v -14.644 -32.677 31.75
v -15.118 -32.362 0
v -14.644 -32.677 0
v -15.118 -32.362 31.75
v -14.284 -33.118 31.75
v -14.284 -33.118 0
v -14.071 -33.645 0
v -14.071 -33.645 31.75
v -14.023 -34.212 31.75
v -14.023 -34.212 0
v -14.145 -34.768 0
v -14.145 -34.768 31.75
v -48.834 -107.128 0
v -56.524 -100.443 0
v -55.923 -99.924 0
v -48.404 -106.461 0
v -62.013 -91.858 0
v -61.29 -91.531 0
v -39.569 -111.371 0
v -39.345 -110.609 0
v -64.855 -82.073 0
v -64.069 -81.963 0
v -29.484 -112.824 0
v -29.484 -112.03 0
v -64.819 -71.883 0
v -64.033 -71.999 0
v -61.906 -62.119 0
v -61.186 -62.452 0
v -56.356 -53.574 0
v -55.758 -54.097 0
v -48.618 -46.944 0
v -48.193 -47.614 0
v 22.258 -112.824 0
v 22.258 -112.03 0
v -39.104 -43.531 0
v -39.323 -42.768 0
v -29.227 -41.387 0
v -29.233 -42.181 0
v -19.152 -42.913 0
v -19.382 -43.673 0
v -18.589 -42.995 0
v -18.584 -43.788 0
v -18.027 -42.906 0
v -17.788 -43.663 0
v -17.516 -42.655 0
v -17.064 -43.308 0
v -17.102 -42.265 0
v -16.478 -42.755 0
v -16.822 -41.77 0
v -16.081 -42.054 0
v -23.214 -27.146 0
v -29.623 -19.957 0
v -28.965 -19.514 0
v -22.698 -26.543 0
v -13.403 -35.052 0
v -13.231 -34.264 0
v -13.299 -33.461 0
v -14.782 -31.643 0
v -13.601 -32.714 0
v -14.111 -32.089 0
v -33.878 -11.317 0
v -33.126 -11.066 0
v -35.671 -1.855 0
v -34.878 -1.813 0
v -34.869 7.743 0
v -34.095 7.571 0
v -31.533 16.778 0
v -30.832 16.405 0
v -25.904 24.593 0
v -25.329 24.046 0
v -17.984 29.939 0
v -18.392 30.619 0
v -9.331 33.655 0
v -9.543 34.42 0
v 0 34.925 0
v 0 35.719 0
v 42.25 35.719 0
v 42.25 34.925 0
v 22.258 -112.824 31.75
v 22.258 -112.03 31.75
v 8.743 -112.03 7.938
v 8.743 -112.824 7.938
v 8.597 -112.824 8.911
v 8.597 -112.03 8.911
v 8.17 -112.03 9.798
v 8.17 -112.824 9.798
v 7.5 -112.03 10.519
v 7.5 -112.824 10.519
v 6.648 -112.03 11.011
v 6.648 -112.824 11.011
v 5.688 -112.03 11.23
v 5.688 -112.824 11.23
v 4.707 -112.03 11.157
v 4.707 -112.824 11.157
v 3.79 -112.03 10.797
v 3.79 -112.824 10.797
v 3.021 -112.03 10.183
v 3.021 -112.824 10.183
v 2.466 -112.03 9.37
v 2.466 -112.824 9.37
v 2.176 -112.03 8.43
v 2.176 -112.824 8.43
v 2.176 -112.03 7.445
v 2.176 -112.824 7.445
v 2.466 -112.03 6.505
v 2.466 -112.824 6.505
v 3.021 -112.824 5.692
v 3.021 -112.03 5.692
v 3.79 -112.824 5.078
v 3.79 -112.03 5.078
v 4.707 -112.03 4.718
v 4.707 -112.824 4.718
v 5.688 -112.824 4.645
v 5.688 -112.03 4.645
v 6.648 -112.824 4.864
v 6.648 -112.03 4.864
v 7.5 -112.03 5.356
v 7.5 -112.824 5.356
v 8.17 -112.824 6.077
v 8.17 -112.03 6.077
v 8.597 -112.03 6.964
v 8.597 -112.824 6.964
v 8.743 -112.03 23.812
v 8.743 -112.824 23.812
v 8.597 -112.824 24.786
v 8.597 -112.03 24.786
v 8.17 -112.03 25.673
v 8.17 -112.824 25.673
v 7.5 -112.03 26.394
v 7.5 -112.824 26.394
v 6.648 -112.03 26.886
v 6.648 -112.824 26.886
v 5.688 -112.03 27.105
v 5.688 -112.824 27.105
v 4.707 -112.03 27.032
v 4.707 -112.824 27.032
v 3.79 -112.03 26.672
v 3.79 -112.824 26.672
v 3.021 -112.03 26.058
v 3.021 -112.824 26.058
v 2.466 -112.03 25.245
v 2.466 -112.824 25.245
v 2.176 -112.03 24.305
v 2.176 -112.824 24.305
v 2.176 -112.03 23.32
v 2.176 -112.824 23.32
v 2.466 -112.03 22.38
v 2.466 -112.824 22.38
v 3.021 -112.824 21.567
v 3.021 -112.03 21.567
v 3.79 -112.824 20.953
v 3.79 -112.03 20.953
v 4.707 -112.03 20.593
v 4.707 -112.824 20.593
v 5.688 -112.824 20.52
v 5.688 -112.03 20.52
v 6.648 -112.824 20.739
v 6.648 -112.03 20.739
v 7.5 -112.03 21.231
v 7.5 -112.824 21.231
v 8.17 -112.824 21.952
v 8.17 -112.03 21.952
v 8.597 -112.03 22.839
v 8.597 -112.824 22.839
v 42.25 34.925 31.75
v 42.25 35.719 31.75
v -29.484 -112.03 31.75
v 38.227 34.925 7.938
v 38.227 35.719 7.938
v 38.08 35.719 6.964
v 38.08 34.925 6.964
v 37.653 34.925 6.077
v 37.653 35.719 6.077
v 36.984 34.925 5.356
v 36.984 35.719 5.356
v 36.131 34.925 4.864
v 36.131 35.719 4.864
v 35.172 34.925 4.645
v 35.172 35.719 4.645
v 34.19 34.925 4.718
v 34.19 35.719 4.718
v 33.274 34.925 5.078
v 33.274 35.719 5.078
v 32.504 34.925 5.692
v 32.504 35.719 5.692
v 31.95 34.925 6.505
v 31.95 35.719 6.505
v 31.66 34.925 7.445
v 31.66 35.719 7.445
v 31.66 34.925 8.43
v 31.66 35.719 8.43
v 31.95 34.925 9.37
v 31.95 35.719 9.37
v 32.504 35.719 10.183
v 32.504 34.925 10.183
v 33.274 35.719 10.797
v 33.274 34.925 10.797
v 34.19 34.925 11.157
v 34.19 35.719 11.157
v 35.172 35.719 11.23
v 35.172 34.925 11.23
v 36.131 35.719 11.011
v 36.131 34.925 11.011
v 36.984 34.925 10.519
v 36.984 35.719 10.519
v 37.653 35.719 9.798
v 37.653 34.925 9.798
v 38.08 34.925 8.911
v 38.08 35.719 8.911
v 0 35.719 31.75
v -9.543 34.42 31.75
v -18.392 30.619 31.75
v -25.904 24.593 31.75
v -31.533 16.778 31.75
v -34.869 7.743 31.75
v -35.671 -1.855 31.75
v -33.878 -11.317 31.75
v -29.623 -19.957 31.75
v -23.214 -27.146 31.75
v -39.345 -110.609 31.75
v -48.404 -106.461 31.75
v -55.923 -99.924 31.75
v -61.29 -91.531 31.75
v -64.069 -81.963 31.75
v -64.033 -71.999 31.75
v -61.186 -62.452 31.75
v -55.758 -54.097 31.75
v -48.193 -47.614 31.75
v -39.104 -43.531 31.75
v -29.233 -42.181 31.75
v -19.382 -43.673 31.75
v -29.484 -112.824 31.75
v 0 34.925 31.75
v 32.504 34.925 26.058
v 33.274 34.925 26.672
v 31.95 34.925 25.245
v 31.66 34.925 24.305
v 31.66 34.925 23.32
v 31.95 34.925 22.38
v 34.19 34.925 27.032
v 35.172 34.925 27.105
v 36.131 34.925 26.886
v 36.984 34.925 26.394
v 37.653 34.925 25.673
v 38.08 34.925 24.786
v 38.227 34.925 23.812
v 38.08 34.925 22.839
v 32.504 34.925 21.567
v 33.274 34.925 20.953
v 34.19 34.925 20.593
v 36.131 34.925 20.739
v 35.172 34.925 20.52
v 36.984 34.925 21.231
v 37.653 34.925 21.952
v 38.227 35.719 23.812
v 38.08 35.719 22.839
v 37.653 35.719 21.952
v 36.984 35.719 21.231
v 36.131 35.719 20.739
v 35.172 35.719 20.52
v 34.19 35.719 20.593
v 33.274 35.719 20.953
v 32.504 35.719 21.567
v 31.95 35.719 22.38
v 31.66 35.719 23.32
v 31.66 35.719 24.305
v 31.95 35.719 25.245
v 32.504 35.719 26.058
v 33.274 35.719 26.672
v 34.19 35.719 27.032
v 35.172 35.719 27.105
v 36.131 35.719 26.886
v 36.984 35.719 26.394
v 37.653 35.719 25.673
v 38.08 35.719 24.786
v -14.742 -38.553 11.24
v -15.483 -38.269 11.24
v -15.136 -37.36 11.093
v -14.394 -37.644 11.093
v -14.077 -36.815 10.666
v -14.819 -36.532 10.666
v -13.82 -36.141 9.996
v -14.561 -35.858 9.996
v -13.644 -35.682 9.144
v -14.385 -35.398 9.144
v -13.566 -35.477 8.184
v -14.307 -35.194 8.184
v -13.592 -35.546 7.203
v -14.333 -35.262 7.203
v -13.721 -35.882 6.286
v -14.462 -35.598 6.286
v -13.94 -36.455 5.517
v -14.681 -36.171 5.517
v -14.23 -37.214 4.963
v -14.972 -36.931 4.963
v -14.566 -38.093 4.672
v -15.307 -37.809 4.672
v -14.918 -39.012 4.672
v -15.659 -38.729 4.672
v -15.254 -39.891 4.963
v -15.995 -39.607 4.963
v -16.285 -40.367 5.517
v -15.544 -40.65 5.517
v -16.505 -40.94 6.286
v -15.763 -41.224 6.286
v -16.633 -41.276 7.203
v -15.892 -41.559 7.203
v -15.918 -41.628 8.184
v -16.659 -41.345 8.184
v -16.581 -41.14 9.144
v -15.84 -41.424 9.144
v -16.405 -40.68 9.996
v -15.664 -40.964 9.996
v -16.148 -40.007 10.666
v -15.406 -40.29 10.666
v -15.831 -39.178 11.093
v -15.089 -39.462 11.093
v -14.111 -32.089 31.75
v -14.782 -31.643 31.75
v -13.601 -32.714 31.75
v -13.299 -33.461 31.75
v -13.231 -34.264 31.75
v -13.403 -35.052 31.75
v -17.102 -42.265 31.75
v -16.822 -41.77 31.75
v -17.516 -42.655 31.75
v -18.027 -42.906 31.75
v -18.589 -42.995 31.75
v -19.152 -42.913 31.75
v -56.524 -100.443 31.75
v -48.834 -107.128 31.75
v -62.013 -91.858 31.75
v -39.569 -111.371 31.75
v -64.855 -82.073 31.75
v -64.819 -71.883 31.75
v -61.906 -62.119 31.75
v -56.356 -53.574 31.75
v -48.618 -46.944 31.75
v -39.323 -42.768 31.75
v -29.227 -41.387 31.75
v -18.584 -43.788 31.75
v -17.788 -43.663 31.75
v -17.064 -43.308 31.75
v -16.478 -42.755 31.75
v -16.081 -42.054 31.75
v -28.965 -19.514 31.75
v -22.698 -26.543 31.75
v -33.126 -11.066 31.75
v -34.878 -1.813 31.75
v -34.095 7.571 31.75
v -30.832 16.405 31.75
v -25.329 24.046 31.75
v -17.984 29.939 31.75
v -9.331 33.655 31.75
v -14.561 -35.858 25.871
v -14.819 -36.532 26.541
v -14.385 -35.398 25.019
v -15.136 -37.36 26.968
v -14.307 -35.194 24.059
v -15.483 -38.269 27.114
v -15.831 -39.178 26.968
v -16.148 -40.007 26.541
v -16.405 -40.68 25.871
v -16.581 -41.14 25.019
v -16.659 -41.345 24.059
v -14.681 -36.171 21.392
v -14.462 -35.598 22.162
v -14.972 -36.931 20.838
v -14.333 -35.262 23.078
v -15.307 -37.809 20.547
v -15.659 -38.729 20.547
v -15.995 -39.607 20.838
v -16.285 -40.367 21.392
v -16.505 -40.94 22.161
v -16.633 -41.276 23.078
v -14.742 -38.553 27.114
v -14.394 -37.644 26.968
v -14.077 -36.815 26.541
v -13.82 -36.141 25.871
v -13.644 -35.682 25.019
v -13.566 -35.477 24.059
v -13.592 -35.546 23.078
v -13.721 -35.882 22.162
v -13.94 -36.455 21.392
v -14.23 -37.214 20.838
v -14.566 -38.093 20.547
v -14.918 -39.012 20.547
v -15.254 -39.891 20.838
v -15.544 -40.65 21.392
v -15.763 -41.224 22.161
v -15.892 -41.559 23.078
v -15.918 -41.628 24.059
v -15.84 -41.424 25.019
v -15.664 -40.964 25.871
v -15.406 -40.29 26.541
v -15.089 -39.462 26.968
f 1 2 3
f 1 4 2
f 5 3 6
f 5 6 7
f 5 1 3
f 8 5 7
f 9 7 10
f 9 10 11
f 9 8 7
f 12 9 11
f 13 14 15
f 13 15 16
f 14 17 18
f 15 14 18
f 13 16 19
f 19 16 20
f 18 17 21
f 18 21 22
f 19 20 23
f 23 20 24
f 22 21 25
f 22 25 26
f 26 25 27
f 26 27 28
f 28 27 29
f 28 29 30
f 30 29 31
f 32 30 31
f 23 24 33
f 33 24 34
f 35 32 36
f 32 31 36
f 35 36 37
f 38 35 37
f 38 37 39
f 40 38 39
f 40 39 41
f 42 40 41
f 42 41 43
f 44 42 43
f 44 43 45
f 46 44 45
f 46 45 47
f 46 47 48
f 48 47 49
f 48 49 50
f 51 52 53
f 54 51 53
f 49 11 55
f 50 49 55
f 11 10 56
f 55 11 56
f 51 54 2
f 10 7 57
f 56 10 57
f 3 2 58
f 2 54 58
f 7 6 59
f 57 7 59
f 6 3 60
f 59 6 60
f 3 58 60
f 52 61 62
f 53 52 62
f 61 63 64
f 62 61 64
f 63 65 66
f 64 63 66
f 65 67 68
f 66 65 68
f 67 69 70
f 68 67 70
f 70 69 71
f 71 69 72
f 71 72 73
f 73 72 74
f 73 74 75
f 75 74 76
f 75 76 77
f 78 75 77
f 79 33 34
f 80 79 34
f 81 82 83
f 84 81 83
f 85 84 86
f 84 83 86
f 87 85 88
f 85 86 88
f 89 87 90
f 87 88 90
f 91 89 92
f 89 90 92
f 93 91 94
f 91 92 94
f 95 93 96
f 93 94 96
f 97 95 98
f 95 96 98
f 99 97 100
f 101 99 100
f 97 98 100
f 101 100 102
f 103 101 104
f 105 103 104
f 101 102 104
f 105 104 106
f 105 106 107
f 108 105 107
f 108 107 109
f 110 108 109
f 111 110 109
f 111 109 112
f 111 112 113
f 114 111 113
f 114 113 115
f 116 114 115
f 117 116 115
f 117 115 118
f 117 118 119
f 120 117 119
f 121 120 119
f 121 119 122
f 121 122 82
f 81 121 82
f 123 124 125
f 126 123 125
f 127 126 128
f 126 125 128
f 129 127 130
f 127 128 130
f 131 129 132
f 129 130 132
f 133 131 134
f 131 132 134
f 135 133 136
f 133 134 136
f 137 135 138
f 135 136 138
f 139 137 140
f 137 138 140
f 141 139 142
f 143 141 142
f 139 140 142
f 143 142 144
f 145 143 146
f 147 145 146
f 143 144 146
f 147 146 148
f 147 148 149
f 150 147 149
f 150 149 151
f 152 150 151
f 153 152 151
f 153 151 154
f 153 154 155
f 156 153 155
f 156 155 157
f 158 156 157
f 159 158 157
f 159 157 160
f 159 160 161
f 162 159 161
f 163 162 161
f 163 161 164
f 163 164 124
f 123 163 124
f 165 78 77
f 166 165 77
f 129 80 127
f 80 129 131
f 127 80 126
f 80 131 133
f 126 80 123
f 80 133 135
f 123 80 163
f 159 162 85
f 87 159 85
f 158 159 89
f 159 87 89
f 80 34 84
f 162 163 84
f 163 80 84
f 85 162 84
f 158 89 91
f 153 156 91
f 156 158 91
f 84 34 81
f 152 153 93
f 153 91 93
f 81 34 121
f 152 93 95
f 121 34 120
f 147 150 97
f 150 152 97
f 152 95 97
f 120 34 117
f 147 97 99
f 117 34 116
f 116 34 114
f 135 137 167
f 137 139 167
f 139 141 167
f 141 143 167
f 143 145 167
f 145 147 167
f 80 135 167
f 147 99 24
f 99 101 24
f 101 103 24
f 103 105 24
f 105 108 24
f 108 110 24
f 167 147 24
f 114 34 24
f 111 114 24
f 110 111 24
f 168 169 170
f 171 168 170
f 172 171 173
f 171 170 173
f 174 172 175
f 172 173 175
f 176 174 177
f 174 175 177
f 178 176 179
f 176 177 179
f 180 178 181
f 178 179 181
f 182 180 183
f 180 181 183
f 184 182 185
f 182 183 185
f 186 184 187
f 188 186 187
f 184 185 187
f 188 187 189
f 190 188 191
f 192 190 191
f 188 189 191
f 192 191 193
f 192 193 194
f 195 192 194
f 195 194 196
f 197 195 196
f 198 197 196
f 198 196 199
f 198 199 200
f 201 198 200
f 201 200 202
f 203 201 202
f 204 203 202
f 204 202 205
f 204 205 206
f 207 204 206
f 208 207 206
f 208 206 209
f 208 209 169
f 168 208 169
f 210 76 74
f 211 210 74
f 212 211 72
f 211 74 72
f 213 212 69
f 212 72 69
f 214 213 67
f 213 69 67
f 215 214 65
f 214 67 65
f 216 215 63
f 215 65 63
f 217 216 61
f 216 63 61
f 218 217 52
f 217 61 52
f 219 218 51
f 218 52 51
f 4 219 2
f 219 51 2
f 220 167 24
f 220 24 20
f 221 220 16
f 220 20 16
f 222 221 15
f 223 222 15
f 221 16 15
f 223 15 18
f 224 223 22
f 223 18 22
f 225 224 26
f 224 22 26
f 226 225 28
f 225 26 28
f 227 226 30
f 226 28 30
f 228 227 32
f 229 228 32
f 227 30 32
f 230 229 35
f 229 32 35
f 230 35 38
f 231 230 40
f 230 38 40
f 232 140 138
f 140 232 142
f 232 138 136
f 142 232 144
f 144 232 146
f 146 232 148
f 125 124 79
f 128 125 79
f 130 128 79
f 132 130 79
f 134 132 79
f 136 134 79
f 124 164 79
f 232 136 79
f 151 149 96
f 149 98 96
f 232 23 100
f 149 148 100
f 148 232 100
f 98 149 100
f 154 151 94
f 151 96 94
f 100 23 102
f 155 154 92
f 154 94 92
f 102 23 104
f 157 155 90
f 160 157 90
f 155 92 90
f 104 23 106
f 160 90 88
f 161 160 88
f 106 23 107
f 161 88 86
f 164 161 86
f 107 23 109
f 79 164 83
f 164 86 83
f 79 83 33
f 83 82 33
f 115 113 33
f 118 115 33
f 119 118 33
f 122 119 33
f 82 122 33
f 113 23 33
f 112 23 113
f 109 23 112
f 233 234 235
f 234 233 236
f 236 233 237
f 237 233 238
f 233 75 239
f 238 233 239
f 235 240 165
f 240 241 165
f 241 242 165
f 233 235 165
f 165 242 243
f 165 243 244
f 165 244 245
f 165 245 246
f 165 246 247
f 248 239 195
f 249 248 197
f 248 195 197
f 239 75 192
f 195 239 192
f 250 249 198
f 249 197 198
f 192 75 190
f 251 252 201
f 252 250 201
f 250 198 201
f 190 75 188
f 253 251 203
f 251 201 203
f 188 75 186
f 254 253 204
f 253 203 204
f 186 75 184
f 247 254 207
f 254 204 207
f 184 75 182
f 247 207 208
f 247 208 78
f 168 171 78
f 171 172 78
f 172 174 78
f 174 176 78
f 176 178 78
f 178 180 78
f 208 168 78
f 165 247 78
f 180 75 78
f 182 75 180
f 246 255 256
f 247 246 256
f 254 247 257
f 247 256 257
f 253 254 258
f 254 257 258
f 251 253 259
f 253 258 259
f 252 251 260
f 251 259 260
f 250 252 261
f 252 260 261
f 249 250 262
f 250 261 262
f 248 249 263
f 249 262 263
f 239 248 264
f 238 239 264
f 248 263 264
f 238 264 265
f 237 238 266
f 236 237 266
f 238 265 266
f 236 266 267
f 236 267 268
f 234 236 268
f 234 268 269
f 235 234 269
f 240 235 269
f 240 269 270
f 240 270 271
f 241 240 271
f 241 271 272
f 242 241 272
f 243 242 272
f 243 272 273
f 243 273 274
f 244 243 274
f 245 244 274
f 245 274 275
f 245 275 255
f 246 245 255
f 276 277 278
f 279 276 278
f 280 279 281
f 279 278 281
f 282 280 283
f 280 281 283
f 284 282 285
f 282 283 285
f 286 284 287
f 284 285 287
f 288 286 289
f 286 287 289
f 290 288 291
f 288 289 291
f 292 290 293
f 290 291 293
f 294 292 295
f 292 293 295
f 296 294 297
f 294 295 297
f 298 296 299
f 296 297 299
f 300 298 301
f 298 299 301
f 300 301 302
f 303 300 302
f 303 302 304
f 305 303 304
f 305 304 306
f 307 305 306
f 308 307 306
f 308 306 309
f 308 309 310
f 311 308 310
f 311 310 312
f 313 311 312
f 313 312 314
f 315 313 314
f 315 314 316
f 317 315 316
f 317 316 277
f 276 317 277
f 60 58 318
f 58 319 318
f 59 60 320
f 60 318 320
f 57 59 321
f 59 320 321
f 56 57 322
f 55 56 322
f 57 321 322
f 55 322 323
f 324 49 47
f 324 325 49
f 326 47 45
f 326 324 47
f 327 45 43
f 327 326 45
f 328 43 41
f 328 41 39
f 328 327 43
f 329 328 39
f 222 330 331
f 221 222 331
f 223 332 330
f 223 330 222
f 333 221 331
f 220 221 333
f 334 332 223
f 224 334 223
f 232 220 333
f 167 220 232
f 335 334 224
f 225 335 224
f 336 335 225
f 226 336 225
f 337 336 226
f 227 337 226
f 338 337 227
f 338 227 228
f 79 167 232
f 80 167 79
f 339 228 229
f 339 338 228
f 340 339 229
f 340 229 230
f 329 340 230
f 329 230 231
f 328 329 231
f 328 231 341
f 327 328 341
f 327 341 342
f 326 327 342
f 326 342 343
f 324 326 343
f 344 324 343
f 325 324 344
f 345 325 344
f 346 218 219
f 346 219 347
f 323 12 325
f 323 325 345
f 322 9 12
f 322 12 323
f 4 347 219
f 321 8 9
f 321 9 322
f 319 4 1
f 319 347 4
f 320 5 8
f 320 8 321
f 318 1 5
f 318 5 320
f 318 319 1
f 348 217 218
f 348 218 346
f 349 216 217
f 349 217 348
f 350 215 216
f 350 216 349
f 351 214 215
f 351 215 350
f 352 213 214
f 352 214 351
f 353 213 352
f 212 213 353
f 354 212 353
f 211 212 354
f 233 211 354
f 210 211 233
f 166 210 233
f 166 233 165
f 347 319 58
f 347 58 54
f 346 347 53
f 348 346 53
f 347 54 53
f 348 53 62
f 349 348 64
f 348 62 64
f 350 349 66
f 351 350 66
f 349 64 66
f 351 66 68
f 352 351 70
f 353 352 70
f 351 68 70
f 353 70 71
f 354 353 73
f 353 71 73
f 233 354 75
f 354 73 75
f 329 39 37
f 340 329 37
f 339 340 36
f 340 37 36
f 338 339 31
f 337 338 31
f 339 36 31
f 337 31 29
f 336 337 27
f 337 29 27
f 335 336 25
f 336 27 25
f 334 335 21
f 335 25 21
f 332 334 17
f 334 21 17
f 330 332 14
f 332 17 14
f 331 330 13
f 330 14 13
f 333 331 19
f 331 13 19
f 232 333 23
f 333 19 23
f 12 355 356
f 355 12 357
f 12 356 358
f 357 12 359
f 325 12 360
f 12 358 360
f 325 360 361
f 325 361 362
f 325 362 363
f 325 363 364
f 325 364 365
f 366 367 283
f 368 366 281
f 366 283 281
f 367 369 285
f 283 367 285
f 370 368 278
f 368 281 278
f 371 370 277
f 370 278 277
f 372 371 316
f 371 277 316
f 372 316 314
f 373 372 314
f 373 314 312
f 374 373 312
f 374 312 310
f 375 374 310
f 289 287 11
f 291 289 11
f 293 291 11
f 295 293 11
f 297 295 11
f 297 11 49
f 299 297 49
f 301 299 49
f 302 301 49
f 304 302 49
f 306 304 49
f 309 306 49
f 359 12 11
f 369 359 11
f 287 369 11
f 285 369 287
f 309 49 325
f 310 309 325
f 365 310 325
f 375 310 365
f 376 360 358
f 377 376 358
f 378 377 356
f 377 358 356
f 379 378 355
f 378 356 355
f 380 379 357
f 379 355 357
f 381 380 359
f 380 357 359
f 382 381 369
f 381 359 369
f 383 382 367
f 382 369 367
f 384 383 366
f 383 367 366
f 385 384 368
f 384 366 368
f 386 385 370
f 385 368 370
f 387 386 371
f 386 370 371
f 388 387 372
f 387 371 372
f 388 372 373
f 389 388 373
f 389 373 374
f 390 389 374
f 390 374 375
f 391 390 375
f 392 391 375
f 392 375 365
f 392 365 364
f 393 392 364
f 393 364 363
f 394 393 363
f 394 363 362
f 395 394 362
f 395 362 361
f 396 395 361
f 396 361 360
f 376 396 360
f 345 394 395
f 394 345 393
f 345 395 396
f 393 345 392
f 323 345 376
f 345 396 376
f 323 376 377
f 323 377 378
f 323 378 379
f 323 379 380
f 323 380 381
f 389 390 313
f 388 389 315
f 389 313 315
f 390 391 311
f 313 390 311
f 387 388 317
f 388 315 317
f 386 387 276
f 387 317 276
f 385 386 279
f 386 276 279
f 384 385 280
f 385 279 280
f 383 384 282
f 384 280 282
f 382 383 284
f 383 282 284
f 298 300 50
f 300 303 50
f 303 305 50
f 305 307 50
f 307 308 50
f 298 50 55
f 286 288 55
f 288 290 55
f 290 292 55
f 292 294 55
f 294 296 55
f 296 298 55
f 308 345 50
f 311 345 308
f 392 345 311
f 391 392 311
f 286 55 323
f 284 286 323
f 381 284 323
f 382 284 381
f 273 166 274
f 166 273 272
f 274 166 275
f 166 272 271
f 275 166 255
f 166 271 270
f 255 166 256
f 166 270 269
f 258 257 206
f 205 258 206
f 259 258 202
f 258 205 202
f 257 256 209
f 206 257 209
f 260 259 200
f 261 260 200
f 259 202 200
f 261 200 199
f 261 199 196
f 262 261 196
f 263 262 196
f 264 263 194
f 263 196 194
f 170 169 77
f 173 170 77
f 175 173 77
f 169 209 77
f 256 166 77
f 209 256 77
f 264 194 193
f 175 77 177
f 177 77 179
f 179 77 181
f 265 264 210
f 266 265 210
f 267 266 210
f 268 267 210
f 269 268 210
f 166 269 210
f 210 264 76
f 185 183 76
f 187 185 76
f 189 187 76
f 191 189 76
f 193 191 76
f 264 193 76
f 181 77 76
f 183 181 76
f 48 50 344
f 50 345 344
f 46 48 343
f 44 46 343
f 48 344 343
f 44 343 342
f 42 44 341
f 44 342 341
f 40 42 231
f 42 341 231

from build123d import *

# Parameters (mm, degrees)
BOSS_EXTRUDE1_DEPTH = 31.75
SKETCH2_R           = 3.302
CUT_EXTRUDE1_DEPTH  = 81.553334057
SKETCH3_R           = 3.302
CUT_EXTRUDE2_DEPTH  = 31.75
SKETCH4_R           = 3.302
CUT_EXTRUDE3_DEPTH  = 31.75
FILLET1_R           = 1.905
FILLET2_R           = 2.69875


with BuildPart() as part:
    # Sketch1 → Boss-Extrude1 (new body)
    with BuildSketch(Plane.XY):
        with BuildLine():
            Line((-17.009825212, -44.483777619), (-12.473871822, -32.621436921))
            ThreePointArc((-12.473871822, -32.621436921), (-34.344281252, 6.34239468), (0, 34.925))
            Line((0, 34.925), (42.249880176, 34.925))
            Line((42.249880176, 34.925), (42.249880176, 35.71875))
            Line((42.249880176, 35.71875), (0, 35.71875))
            ThreePointArc((0, 35.71875), (-35.050587448, 6.876439568), (-13.495614846, -33.071097373))
            Line((-13.495614846, -33.071097373), (-17.470874776, -43.467122992))
            ThreePointArc((-17.470874776, -43.467122992), (-64.678438716, -71.009375011), (-29.483697034, -112.82396454))
            Line((-29.483697034, -112.82396454), (22.258027731, -112.82396454))
            Line((22.258027731, -112.82396454), (22.258027731, -112.03021454))
            Line((22.258027731, -112.03021454), (-29.483697034, -112.03021454))
            ThreePointArc((-29.483697034, -112.03021454), (-63.827978286, -70.76281986), (-17.009825212, -44.483777619))
        make_face()
    extrude(amount=BOSS_EXTRUDE1_DEPTH)

    # Sketch2 → Cut-Extrude1 (cut, through all)
    with BuildSketch(Plane(origin=(-0.741396294, 0.283497087, 0), x_dir=(0, 0, 1), z_dir=(-0.934042575, 0.357161684, 0))):
        with Locations((7.9375, -41.275)):
            Circle(SKETCH2_R)
        with Locations((23.8125, -41.275)):
            Circle(SKETCH2_R)
    extrude(amount=-CUT_EXTRUDE1_DEPTH, mode=Mode.SUBTRACT)

    # Sketch3 → Cut-Extrude2 (cut)
    with BuildSketch(Plane(origin=(0, 35.71875, 0), x_dir=(1, 0, 0), z_dir=(0, 1, 0))):
        with Locations((34.925, -7.9375)):
            Circle(SKETCH3_R)
        with Locations((34.925, -23.8125)):
            Circle(SKETCH3_R)
    extrude(amount=-CUT_EXTRUDE2_DEPTH, mode=Mode.SUBTRACT)

    # Sketch4 → Cut-Extrude3 (cut)
    with BuildSketch(Plane.XZ.offset(112.82396454)):
        with Locations((5.441302966, 23.8125)):
            Circle(SKETCH4_R)
        with Locations((5.441302966, 7.9375)):
            Circle(SKETCH4_R)
    extrude(amount=-CUT_EXTRUDE3_DEPTH, mode=Mode.SUBTRACT)

    # Fillet1
    fillet1_edges = [part.edges().sort_by_distance(p)[0] for p in [
        (-17.470874776, -43.467122992, 15.875),
        (-13.495614846, -33.071097373, 15.875),
    ]]
    fillet(fillet1_edges, radius=FILLET1_R)

    # Fillet2
    fillet2_edges = [part.edges().sort_by_distance(p)[0] for p in [
        (-12.473871822, -32.621436921, 15.875),
        (-17.009825212, -44.483777619, 15.875),
    ]]
    fillet(fillet2_edges, radius=FILLET2_R)


solid = part.part
